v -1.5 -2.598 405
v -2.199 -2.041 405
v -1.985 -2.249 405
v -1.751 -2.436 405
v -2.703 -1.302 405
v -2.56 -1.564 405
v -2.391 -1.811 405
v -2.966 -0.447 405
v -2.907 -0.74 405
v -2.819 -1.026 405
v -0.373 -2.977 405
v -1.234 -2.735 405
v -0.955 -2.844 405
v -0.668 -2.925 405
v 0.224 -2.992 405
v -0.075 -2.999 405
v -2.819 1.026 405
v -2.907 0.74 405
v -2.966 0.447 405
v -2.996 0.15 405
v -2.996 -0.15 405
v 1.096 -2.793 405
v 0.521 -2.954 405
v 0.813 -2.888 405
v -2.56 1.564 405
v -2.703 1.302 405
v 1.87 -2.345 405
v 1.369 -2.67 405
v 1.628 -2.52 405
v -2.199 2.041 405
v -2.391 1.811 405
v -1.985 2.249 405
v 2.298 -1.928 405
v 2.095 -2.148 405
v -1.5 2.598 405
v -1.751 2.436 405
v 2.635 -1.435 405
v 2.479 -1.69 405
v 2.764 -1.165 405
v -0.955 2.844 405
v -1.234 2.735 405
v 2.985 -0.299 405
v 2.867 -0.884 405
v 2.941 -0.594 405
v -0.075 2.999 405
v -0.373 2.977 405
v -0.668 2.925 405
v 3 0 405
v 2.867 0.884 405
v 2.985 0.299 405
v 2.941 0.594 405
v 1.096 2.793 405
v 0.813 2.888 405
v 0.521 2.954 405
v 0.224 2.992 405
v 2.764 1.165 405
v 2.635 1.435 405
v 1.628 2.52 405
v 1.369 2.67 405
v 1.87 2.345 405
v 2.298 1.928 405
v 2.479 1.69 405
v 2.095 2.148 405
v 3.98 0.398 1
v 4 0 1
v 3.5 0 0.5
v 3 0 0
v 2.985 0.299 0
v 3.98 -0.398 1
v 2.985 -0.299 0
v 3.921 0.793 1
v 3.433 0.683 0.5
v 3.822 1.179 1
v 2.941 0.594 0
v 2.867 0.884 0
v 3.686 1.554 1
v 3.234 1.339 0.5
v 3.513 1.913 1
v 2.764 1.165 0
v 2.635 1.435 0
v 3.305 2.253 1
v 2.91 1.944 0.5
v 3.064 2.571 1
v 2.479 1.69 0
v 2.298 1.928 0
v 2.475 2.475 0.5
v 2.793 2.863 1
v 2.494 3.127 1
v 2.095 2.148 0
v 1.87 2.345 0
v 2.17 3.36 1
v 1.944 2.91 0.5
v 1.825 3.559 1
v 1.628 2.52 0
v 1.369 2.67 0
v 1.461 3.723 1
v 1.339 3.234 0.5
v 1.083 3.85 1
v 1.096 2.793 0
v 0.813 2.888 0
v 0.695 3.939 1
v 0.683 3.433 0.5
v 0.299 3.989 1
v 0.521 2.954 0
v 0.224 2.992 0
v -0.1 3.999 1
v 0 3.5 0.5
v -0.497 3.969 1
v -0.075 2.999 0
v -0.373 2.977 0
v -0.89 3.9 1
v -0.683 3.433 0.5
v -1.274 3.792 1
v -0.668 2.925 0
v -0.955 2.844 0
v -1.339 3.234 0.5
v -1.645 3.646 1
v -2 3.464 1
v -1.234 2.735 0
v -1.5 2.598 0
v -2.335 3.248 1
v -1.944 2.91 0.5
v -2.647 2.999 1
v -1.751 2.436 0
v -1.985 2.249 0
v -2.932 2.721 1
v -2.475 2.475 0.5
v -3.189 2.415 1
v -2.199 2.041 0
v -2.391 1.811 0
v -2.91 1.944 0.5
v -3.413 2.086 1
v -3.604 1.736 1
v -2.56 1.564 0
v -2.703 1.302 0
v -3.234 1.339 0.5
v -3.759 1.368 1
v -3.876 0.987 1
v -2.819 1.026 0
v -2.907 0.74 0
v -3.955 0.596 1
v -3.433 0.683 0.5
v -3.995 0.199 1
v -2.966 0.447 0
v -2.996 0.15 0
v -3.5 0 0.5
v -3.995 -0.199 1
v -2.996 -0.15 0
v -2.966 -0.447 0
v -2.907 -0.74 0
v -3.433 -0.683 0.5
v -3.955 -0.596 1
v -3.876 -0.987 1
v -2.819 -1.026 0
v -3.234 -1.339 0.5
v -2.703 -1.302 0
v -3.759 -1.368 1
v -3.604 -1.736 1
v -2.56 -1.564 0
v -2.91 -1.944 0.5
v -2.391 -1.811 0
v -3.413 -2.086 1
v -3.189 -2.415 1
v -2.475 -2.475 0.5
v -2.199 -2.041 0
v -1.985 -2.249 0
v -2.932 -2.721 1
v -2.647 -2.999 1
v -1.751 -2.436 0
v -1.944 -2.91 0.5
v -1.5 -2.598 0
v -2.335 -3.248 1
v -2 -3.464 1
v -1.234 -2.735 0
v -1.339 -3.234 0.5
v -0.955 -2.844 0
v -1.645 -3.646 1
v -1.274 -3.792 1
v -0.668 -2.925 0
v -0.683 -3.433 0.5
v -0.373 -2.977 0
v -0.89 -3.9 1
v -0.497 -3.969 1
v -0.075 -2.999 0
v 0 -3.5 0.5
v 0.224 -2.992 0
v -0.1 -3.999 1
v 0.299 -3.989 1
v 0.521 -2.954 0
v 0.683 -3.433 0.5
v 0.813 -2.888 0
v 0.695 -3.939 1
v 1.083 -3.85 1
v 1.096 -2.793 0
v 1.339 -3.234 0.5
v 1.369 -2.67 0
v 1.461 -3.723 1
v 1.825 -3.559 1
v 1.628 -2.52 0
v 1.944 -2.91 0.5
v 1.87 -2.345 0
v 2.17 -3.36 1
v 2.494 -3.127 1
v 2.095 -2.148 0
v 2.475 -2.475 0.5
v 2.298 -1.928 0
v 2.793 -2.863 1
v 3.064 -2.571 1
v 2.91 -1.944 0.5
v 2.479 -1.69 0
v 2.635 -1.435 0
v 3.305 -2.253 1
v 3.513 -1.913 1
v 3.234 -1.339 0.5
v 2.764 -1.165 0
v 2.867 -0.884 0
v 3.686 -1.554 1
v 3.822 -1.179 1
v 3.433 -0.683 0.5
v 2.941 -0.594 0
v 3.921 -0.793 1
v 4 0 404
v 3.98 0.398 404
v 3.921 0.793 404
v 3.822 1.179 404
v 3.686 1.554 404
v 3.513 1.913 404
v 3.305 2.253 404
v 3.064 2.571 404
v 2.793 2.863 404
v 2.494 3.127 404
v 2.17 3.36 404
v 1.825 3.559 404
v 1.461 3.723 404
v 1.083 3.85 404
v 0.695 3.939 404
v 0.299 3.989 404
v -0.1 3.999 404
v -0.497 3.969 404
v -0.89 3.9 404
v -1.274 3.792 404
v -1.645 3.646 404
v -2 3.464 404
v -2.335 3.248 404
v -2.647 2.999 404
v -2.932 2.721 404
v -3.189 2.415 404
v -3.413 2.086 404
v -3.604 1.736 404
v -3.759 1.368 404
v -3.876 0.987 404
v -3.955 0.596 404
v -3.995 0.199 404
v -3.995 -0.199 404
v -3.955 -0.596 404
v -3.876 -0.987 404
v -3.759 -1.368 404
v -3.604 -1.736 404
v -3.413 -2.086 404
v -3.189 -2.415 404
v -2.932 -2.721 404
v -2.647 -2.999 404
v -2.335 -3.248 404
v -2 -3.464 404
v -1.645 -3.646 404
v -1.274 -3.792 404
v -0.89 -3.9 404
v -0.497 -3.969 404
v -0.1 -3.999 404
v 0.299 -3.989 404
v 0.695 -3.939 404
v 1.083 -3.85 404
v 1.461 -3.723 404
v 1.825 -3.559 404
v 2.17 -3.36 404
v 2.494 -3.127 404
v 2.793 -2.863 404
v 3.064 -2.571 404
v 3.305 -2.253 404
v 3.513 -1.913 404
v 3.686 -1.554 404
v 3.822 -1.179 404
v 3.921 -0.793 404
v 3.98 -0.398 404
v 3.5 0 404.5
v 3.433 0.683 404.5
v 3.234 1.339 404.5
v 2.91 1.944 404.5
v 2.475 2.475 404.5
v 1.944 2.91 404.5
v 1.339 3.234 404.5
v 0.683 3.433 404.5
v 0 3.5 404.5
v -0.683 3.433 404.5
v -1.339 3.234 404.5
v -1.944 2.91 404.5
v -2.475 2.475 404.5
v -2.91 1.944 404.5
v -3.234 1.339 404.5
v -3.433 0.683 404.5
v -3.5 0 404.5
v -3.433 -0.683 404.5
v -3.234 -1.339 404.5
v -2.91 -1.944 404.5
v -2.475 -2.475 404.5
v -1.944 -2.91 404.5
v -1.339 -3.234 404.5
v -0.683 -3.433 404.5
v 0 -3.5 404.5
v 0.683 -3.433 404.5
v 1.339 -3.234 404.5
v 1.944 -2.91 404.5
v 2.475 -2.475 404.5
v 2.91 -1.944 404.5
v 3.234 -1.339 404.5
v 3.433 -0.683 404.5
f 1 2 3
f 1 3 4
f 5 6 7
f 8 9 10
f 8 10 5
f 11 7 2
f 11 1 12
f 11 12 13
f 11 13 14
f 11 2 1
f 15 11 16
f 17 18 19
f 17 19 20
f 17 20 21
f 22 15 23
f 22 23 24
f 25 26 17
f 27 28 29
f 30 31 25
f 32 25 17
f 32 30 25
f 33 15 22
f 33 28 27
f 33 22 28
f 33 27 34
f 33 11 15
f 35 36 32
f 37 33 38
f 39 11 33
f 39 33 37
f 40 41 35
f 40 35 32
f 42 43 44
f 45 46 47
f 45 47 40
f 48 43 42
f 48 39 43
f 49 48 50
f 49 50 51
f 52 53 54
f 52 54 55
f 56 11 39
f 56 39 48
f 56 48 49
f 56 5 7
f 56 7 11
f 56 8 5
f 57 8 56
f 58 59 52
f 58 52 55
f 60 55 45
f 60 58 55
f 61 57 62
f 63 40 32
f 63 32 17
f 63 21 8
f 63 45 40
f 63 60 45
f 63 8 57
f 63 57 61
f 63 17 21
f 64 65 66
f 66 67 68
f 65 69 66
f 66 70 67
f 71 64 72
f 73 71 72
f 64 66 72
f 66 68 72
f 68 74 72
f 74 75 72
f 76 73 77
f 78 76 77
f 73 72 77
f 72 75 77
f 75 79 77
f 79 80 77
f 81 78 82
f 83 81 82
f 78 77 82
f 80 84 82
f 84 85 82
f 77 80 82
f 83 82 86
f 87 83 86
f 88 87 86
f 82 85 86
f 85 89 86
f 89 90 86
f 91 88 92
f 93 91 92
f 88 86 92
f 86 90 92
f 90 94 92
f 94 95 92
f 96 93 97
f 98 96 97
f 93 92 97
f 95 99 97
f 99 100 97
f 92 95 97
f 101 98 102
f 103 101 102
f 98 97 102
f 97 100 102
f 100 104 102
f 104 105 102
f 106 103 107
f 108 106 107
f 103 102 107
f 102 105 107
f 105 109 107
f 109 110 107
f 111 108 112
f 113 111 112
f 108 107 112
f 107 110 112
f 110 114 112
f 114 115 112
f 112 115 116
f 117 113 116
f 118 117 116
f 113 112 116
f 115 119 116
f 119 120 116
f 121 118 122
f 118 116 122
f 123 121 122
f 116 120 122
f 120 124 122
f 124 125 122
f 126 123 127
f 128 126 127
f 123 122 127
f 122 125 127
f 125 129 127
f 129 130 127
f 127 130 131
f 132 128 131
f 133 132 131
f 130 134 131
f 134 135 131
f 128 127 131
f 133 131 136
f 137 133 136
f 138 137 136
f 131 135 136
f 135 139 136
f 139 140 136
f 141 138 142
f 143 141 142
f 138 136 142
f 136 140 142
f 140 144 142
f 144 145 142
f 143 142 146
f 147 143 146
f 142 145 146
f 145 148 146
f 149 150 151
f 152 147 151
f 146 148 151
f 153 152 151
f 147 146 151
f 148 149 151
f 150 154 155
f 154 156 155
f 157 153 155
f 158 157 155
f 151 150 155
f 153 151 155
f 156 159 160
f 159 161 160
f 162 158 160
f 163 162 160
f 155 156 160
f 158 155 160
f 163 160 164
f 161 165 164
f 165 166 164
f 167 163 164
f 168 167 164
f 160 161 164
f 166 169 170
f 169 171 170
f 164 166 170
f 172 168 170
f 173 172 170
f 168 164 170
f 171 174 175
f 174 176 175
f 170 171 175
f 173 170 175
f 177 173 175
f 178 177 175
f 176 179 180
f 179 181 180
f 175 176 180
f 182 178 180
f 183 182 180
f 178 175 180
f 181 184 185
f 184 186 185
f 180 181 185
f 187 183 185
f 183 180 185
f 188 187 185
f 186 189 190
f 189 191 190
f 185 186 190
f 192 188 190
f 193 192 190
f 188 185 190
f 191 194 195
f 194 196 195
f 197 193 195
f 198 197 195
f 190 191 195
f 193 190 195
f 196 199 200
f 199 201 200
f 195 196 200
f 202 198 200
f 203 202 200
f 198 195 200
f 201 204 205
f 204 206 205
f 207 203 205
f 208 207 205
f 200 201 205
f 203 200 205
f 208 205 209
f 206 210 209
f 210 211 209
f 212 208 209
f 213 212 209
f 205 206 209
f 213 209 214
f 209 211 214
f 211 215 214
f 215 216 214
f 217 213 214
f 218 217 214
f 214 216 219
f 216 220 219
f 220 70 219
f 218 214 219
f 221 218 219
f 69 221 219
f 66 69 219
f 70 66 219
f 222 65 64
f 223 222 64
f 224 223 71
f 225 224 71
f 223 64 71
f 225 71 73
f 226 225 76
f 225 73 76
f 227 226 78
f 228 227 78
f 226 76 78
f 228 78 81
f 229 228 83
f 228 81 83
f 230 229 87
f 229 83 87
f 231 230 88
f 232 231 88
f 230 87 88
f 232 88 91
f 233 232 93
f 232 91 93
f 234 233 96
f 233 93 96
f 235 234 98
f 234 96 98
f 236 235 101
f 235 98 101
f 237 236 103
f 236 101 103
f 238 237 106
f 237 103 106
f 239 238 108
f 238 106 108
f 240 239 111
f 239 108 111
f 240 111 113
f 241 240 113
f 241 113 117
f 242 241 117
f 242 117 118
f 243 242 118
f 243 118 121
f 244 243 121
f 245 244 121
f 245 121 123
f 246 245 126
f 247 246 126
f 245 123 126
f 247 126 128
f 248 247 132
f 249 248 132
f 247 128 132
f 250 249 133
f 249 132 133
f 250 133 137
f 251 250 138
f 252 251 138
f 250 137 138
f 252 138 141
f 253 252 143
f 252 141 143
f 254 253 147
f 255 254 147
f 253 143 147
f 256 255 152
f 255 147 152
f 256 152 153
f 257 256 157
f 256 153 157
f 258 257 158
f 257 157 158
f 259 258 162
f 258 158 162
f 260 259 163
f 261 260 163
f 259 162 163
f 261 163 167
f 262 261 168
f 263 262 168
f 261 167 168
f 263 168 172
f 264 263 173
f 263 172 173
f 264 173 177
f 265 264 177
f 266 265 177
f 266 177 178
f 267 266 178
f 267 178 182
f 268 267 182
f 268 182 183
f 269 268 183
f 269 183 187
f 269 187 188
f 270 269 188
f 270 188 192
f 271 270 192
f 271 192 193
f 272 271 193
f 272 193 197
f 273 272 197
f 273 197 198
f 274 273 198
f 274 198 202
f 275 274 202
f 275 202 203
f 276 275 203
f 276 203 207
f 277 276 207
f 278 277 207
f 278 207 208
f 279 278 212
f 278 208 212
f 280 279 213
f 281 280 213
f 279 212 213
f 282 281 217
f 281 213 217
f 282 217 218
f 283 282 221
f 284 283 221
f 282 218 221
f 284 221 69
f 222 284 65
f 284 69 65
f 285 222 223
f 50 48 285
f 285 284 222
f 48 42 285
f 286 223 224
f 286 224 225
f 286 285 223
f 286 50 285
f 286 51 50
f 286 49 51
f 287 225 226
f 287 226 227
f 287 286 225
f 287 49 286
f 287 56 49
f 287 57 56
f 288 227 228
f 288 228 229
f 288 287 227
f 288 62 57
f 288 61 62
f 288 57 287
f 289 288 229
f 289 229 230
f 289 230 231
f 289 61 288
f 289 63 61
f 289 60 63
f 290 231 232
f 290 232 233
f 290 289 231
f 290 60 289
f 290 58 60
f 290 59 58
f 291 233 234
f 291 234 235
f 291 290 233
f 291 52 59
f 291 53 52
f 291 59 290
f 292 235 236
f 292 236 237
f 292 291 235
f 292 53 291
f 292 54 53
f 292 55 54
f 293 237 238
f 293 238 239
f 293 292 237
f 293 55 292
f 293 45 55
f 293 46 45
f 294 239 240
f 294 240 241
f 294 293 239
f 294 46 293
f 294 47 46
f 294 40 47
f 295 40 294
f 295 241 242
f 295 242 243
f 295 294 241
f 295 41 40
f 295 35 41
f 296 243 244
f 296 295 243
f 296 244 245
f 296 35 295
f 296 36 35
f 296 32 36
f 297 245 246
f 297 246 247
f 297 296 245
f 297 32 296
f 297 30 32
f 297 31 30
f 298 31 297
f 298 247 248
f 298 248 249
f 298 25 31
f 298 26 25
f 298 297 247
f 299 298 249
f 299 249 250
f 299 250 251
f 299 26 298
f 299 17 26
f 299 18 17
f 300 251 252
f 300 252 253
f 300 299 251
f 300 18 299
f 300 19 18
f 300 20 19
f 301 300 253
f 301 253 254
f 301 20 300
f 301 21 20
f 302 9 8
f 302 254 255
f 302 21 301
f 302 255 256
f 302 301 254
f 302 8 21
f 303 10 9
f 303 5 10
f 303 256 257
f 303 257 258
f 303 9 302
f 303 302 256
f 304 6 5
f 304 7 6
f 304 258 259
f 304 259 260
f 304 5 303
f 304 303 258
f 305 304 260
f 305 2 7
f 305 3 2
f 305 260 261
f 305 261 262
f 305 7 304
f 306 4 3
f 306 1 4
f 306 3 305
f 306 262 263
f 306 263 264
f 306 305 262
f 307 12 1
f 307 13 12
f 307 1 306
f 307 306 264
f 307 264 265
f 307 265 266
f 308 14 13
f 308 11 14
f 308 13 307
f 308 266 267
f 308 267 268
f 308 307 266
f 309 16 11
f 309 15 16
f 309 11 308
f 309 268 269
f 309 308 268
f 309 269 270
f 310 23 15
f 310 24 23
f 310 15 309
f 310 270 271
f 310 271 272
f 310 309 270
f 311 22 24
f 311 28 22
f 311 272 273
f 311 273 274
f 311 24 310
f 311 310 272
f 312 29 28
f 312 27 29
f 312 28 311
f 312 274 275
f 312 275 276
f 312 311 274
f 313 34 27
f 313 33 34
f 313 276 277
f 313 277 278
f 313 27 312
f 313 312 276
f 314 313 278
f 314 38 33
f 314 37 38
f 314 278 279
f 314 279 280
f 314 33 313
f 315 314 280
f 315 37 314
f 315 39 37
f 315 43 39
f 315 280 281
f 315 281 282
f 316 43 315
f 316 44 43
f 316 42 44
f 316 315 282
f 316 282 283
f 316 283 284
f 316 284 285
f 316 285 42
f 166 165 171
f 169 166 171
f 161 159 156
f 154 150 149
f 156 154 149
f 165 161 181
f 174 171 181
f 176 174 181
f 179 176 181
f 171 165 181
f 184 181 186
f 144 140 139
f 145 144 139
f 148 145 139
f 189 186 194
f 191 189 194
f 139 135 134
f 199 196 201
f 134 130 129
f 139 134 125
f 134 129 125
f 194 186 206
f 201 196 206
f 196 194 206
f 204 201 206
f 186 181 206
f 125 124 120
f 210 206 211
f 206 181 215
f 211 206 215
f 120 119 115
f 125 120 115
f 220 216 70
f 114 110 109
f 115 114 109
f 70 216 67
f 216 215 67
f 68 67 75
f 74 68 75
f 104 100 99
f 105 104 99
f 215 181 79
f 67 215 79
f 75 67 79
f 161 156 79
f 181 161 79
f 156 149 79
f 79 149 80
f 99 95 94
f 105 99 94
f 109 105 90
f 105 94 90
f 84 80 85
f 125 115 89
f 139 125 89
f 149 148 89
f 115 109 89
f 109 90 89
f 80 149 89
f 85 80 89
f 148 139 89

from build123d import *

# Parameters (mm, degrees)
SKETCH1_R           = 4
BOSS_EXTRUDE1_DEPTH = 405
CHAMFER2_SIZE       = 1
CHAMFER3_SIZE       = 1


with BuildPart() as part:
    # Sketch1 → Boss-Extrude1 (new body)
    with BuildSketch(Plane.XY):
        Circle(SKETCH1_R)
    extrude(amount=BOSS_EXTRUDE1_DEPTH)

    # Chamfer2
    chamfer2_edges = [part.edges().sort_by_distance(p)[0] for p in [
        (-4, 0, 0),
    ]]
    chamfer(chamfer2_edges, length=CHAMFER2_SIZE)

    # Chamfer3
    chamfer3_edges = [part.edges().sort_by_distance(p)[0] for p in [
        (-4, 0, 405),
    ]]
    chamfer(chamfer3_edges, length=CHAMFER3_SIZE)


solid = part.part
